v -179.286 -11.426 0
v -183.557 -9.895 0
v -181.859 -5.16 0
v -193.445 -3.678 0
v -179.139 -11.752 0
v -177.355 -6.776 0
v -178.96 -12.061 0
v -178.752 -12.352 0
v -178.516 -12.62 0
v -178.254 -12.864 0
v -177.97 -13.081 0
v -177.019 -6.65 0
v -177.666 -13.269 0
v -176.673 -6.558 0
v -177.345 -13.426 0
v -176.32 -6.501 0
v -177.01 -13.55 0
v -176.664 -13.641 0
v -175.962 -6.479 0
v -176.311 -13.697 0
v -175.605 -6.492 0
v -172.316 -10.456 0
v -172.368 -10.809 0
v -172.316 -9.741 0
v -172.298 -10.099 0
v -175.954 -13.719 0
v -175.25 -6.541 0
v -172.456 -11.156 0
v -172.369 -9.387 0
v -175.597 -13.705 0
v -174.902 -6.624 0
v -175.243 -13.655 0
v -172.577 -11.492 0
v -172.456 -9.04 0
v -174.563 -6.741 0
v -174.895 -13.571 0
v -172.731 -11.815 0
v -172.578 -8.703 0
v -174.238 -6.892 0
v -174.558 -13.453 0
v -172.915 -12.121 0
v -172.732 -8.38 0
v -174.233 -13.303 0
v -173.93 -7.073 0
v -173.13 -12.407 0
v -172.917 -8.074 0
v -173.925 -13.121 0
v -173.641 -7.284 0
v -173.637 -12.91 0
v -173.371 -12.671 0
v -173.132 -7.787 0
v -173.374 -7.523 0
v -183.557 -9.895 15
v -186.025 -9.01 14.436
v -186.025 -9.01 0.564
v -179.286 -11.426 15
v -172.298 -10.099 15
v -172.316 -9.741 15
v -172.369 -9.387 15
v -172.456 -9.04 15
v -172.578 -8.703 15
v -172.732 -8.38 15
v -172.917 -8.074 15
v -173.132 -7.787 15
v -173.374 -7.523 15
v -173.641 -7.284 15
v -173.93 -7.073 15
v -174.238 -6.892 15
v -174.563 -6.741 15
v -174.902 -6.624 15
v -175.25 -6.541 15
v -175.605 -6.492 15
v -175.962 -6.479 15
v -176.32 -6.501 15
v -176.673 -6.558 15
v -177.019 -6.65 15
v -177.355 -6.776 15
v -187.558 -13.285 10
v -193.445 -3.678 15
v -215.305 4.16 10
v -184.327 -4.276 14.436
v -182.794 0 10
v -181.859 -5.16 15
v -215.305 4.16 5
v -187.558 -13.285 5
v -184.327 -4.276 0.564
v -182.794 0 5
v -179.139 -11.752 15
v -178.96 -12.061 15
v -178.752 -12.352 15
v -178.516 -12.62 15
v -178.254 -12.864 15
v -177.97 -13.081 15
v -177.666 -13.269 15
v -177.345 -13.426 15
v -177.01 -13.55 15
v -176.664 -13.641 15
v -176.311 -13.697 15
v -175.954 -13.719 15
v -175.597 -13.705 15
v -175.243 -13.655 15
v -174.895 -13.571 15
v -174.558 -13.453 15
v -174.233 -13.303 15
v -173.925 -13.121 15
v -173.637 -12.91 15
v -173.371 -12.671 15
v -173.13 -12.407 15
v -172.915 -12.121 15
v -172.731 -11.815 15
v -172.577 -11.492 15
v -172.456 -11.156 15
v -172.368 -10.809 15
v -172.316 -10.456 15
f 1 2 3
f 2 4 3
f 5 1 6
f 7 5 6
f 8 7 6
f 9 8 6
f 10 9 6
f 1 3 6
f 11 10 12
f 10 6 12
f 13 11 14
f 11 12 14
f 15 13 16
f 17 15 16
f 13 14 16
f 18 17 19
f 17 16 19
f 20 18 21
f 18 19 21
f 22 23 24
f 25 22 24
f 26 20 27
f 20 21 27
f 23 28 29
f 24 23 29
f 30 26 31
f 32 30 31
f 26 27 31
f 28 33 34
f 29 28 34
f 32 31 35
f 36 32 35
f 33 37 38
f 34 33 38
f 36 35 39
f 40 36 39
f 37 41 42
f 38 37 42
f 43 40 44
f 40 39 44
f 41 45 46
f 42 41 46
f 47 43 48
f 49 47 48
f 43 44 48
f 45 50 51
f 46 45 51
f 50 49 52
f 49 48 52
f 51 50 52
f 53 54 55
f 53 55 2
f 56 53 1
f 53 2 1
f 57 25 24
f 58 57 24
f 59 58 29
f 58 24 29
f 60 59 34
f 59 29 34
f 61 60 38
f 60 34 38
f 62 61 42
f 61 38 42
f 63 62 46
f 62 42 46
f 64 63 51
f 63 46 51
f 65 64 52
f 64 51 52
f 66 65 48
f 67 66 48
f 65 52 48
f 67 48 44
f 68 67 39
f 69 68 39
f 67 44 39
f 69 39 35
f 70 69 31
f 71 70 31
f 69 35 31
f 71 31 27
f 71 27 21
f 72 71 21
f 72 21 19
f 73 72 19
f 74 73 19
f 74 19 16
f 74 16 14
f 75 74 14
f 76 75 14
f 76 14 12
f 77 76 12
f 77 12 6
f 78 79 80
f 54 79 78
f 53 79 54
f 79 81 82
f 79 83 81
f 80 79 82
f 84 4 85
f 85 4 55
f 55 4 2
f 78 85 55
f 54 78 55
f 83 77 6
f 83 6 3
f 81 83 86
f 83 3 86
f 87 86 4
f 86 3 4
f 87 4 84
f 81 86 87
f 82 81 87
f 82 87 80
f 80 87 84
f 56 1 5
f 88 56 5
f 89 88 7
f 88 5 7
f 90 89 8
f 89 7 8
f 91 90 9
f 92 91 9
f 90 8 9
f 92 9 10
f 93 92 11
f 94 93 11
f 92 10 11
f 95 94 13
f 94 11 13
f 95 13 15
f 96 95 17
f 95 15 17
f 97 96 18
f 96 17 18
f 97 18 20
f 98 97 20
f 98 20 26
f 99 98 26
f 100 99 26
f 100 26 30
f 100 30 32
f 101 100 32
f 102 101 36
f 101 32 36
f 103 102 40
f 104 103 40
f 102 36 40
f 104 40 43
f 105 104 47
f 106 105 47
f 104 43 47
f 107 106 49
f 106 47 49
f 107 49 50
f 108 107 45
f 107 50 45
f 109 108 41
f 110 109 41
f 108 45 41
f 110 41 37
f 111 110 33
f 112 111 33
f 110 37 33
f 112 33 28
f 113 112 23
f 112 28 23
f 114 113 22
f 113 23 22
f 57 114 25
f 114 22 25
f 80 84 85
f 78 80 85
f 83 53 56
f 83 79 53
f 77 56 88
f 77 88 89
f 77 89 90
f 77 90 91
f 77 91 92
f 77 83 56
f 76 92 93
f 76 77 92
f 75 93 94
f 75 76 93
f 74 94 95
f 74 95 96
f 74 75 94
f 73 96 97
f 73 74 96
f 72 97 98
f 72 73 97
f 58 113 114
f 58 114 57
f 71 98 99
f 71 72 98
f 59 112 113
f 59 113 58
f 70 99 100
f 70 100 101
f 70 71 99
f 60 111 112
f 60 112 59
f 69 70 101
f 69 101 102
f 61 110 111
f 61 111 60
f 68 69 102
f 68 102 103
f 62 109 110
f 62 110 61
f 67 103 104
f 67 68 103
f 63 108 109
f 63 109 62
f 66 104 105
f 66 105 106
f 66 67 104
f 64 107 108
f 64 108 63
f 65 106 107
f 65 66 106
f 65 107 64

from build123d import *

# Parameters (mm, degrees)
F1_DEPTH = 15
F2_SIZE  = 5


with BuildPart() as f1:
    # F0 (on Top) → F1 (new body)
    with BuildSketch(Plane.XY):
        with BuildLine():
            Line((-186.024674, -9.009846), (-179.286195, -11.425942))
            ThreePointArc((-179.286195, -11.425942), (-179.538284, -10.090694), (-179.280339, -8.756566))
            Line((-179.280339, -8.756566), (-215.305157, 4.16021))
            Line((-215.305157, 4.16021), (-187.557676, -13.285381))
            Line((-187.557676, -13.285381), (-186.024674, -9.009846))
        make_face()
        with BuildLine():
            ThreePointArc((-179.280339, -8.756566), (-178.513831, -7.575145), (-177.354514, -6.775599))
            Line((-177.354514, -6.775599), (-184.327177, -4.275535))
            Line((-184.327177, -4.275535), (-182.794174, 0))
            Line((-182.794174, 0), (-215.305157, 4.16021))
            Line((-215.305157, 4.16021), (-179.280339, -8.756566))
        make_face()
        with BuildLine():
            ThreePointArc((-179.286195, -11.425942), (-175.242569, -13.655259), (-172.297879, -10.098635))
            ThreePointArc((-172.297879, -10.098635), (-173.929905, -7.073238), (-177.354514, -6.775599))
            ThreePointArc((-177.354514, -6.775599), (-178.513831, -7.575145), (-179.280339, -8.756566))
            ThreePointArc((-179.280339, -8.756566), (-179.538284, -10.090694), (-179.286195, -11.425942))
        make_face()
    extrude(amount=F1_DEPTH)

    # F2
    f2_edges = [f1.edges().sort_by_distance(p)[0] for p in [
        (-201.431417, -4.562585, 15),
        (-199.049666, 2.080105, 15),
        (-199.049666, 2.080105, 0),
        (-201.431417, -4.562585, 0),
    ]]
    chamfer(f2_edges, length=F2_SIZE)


solid = f1.part
